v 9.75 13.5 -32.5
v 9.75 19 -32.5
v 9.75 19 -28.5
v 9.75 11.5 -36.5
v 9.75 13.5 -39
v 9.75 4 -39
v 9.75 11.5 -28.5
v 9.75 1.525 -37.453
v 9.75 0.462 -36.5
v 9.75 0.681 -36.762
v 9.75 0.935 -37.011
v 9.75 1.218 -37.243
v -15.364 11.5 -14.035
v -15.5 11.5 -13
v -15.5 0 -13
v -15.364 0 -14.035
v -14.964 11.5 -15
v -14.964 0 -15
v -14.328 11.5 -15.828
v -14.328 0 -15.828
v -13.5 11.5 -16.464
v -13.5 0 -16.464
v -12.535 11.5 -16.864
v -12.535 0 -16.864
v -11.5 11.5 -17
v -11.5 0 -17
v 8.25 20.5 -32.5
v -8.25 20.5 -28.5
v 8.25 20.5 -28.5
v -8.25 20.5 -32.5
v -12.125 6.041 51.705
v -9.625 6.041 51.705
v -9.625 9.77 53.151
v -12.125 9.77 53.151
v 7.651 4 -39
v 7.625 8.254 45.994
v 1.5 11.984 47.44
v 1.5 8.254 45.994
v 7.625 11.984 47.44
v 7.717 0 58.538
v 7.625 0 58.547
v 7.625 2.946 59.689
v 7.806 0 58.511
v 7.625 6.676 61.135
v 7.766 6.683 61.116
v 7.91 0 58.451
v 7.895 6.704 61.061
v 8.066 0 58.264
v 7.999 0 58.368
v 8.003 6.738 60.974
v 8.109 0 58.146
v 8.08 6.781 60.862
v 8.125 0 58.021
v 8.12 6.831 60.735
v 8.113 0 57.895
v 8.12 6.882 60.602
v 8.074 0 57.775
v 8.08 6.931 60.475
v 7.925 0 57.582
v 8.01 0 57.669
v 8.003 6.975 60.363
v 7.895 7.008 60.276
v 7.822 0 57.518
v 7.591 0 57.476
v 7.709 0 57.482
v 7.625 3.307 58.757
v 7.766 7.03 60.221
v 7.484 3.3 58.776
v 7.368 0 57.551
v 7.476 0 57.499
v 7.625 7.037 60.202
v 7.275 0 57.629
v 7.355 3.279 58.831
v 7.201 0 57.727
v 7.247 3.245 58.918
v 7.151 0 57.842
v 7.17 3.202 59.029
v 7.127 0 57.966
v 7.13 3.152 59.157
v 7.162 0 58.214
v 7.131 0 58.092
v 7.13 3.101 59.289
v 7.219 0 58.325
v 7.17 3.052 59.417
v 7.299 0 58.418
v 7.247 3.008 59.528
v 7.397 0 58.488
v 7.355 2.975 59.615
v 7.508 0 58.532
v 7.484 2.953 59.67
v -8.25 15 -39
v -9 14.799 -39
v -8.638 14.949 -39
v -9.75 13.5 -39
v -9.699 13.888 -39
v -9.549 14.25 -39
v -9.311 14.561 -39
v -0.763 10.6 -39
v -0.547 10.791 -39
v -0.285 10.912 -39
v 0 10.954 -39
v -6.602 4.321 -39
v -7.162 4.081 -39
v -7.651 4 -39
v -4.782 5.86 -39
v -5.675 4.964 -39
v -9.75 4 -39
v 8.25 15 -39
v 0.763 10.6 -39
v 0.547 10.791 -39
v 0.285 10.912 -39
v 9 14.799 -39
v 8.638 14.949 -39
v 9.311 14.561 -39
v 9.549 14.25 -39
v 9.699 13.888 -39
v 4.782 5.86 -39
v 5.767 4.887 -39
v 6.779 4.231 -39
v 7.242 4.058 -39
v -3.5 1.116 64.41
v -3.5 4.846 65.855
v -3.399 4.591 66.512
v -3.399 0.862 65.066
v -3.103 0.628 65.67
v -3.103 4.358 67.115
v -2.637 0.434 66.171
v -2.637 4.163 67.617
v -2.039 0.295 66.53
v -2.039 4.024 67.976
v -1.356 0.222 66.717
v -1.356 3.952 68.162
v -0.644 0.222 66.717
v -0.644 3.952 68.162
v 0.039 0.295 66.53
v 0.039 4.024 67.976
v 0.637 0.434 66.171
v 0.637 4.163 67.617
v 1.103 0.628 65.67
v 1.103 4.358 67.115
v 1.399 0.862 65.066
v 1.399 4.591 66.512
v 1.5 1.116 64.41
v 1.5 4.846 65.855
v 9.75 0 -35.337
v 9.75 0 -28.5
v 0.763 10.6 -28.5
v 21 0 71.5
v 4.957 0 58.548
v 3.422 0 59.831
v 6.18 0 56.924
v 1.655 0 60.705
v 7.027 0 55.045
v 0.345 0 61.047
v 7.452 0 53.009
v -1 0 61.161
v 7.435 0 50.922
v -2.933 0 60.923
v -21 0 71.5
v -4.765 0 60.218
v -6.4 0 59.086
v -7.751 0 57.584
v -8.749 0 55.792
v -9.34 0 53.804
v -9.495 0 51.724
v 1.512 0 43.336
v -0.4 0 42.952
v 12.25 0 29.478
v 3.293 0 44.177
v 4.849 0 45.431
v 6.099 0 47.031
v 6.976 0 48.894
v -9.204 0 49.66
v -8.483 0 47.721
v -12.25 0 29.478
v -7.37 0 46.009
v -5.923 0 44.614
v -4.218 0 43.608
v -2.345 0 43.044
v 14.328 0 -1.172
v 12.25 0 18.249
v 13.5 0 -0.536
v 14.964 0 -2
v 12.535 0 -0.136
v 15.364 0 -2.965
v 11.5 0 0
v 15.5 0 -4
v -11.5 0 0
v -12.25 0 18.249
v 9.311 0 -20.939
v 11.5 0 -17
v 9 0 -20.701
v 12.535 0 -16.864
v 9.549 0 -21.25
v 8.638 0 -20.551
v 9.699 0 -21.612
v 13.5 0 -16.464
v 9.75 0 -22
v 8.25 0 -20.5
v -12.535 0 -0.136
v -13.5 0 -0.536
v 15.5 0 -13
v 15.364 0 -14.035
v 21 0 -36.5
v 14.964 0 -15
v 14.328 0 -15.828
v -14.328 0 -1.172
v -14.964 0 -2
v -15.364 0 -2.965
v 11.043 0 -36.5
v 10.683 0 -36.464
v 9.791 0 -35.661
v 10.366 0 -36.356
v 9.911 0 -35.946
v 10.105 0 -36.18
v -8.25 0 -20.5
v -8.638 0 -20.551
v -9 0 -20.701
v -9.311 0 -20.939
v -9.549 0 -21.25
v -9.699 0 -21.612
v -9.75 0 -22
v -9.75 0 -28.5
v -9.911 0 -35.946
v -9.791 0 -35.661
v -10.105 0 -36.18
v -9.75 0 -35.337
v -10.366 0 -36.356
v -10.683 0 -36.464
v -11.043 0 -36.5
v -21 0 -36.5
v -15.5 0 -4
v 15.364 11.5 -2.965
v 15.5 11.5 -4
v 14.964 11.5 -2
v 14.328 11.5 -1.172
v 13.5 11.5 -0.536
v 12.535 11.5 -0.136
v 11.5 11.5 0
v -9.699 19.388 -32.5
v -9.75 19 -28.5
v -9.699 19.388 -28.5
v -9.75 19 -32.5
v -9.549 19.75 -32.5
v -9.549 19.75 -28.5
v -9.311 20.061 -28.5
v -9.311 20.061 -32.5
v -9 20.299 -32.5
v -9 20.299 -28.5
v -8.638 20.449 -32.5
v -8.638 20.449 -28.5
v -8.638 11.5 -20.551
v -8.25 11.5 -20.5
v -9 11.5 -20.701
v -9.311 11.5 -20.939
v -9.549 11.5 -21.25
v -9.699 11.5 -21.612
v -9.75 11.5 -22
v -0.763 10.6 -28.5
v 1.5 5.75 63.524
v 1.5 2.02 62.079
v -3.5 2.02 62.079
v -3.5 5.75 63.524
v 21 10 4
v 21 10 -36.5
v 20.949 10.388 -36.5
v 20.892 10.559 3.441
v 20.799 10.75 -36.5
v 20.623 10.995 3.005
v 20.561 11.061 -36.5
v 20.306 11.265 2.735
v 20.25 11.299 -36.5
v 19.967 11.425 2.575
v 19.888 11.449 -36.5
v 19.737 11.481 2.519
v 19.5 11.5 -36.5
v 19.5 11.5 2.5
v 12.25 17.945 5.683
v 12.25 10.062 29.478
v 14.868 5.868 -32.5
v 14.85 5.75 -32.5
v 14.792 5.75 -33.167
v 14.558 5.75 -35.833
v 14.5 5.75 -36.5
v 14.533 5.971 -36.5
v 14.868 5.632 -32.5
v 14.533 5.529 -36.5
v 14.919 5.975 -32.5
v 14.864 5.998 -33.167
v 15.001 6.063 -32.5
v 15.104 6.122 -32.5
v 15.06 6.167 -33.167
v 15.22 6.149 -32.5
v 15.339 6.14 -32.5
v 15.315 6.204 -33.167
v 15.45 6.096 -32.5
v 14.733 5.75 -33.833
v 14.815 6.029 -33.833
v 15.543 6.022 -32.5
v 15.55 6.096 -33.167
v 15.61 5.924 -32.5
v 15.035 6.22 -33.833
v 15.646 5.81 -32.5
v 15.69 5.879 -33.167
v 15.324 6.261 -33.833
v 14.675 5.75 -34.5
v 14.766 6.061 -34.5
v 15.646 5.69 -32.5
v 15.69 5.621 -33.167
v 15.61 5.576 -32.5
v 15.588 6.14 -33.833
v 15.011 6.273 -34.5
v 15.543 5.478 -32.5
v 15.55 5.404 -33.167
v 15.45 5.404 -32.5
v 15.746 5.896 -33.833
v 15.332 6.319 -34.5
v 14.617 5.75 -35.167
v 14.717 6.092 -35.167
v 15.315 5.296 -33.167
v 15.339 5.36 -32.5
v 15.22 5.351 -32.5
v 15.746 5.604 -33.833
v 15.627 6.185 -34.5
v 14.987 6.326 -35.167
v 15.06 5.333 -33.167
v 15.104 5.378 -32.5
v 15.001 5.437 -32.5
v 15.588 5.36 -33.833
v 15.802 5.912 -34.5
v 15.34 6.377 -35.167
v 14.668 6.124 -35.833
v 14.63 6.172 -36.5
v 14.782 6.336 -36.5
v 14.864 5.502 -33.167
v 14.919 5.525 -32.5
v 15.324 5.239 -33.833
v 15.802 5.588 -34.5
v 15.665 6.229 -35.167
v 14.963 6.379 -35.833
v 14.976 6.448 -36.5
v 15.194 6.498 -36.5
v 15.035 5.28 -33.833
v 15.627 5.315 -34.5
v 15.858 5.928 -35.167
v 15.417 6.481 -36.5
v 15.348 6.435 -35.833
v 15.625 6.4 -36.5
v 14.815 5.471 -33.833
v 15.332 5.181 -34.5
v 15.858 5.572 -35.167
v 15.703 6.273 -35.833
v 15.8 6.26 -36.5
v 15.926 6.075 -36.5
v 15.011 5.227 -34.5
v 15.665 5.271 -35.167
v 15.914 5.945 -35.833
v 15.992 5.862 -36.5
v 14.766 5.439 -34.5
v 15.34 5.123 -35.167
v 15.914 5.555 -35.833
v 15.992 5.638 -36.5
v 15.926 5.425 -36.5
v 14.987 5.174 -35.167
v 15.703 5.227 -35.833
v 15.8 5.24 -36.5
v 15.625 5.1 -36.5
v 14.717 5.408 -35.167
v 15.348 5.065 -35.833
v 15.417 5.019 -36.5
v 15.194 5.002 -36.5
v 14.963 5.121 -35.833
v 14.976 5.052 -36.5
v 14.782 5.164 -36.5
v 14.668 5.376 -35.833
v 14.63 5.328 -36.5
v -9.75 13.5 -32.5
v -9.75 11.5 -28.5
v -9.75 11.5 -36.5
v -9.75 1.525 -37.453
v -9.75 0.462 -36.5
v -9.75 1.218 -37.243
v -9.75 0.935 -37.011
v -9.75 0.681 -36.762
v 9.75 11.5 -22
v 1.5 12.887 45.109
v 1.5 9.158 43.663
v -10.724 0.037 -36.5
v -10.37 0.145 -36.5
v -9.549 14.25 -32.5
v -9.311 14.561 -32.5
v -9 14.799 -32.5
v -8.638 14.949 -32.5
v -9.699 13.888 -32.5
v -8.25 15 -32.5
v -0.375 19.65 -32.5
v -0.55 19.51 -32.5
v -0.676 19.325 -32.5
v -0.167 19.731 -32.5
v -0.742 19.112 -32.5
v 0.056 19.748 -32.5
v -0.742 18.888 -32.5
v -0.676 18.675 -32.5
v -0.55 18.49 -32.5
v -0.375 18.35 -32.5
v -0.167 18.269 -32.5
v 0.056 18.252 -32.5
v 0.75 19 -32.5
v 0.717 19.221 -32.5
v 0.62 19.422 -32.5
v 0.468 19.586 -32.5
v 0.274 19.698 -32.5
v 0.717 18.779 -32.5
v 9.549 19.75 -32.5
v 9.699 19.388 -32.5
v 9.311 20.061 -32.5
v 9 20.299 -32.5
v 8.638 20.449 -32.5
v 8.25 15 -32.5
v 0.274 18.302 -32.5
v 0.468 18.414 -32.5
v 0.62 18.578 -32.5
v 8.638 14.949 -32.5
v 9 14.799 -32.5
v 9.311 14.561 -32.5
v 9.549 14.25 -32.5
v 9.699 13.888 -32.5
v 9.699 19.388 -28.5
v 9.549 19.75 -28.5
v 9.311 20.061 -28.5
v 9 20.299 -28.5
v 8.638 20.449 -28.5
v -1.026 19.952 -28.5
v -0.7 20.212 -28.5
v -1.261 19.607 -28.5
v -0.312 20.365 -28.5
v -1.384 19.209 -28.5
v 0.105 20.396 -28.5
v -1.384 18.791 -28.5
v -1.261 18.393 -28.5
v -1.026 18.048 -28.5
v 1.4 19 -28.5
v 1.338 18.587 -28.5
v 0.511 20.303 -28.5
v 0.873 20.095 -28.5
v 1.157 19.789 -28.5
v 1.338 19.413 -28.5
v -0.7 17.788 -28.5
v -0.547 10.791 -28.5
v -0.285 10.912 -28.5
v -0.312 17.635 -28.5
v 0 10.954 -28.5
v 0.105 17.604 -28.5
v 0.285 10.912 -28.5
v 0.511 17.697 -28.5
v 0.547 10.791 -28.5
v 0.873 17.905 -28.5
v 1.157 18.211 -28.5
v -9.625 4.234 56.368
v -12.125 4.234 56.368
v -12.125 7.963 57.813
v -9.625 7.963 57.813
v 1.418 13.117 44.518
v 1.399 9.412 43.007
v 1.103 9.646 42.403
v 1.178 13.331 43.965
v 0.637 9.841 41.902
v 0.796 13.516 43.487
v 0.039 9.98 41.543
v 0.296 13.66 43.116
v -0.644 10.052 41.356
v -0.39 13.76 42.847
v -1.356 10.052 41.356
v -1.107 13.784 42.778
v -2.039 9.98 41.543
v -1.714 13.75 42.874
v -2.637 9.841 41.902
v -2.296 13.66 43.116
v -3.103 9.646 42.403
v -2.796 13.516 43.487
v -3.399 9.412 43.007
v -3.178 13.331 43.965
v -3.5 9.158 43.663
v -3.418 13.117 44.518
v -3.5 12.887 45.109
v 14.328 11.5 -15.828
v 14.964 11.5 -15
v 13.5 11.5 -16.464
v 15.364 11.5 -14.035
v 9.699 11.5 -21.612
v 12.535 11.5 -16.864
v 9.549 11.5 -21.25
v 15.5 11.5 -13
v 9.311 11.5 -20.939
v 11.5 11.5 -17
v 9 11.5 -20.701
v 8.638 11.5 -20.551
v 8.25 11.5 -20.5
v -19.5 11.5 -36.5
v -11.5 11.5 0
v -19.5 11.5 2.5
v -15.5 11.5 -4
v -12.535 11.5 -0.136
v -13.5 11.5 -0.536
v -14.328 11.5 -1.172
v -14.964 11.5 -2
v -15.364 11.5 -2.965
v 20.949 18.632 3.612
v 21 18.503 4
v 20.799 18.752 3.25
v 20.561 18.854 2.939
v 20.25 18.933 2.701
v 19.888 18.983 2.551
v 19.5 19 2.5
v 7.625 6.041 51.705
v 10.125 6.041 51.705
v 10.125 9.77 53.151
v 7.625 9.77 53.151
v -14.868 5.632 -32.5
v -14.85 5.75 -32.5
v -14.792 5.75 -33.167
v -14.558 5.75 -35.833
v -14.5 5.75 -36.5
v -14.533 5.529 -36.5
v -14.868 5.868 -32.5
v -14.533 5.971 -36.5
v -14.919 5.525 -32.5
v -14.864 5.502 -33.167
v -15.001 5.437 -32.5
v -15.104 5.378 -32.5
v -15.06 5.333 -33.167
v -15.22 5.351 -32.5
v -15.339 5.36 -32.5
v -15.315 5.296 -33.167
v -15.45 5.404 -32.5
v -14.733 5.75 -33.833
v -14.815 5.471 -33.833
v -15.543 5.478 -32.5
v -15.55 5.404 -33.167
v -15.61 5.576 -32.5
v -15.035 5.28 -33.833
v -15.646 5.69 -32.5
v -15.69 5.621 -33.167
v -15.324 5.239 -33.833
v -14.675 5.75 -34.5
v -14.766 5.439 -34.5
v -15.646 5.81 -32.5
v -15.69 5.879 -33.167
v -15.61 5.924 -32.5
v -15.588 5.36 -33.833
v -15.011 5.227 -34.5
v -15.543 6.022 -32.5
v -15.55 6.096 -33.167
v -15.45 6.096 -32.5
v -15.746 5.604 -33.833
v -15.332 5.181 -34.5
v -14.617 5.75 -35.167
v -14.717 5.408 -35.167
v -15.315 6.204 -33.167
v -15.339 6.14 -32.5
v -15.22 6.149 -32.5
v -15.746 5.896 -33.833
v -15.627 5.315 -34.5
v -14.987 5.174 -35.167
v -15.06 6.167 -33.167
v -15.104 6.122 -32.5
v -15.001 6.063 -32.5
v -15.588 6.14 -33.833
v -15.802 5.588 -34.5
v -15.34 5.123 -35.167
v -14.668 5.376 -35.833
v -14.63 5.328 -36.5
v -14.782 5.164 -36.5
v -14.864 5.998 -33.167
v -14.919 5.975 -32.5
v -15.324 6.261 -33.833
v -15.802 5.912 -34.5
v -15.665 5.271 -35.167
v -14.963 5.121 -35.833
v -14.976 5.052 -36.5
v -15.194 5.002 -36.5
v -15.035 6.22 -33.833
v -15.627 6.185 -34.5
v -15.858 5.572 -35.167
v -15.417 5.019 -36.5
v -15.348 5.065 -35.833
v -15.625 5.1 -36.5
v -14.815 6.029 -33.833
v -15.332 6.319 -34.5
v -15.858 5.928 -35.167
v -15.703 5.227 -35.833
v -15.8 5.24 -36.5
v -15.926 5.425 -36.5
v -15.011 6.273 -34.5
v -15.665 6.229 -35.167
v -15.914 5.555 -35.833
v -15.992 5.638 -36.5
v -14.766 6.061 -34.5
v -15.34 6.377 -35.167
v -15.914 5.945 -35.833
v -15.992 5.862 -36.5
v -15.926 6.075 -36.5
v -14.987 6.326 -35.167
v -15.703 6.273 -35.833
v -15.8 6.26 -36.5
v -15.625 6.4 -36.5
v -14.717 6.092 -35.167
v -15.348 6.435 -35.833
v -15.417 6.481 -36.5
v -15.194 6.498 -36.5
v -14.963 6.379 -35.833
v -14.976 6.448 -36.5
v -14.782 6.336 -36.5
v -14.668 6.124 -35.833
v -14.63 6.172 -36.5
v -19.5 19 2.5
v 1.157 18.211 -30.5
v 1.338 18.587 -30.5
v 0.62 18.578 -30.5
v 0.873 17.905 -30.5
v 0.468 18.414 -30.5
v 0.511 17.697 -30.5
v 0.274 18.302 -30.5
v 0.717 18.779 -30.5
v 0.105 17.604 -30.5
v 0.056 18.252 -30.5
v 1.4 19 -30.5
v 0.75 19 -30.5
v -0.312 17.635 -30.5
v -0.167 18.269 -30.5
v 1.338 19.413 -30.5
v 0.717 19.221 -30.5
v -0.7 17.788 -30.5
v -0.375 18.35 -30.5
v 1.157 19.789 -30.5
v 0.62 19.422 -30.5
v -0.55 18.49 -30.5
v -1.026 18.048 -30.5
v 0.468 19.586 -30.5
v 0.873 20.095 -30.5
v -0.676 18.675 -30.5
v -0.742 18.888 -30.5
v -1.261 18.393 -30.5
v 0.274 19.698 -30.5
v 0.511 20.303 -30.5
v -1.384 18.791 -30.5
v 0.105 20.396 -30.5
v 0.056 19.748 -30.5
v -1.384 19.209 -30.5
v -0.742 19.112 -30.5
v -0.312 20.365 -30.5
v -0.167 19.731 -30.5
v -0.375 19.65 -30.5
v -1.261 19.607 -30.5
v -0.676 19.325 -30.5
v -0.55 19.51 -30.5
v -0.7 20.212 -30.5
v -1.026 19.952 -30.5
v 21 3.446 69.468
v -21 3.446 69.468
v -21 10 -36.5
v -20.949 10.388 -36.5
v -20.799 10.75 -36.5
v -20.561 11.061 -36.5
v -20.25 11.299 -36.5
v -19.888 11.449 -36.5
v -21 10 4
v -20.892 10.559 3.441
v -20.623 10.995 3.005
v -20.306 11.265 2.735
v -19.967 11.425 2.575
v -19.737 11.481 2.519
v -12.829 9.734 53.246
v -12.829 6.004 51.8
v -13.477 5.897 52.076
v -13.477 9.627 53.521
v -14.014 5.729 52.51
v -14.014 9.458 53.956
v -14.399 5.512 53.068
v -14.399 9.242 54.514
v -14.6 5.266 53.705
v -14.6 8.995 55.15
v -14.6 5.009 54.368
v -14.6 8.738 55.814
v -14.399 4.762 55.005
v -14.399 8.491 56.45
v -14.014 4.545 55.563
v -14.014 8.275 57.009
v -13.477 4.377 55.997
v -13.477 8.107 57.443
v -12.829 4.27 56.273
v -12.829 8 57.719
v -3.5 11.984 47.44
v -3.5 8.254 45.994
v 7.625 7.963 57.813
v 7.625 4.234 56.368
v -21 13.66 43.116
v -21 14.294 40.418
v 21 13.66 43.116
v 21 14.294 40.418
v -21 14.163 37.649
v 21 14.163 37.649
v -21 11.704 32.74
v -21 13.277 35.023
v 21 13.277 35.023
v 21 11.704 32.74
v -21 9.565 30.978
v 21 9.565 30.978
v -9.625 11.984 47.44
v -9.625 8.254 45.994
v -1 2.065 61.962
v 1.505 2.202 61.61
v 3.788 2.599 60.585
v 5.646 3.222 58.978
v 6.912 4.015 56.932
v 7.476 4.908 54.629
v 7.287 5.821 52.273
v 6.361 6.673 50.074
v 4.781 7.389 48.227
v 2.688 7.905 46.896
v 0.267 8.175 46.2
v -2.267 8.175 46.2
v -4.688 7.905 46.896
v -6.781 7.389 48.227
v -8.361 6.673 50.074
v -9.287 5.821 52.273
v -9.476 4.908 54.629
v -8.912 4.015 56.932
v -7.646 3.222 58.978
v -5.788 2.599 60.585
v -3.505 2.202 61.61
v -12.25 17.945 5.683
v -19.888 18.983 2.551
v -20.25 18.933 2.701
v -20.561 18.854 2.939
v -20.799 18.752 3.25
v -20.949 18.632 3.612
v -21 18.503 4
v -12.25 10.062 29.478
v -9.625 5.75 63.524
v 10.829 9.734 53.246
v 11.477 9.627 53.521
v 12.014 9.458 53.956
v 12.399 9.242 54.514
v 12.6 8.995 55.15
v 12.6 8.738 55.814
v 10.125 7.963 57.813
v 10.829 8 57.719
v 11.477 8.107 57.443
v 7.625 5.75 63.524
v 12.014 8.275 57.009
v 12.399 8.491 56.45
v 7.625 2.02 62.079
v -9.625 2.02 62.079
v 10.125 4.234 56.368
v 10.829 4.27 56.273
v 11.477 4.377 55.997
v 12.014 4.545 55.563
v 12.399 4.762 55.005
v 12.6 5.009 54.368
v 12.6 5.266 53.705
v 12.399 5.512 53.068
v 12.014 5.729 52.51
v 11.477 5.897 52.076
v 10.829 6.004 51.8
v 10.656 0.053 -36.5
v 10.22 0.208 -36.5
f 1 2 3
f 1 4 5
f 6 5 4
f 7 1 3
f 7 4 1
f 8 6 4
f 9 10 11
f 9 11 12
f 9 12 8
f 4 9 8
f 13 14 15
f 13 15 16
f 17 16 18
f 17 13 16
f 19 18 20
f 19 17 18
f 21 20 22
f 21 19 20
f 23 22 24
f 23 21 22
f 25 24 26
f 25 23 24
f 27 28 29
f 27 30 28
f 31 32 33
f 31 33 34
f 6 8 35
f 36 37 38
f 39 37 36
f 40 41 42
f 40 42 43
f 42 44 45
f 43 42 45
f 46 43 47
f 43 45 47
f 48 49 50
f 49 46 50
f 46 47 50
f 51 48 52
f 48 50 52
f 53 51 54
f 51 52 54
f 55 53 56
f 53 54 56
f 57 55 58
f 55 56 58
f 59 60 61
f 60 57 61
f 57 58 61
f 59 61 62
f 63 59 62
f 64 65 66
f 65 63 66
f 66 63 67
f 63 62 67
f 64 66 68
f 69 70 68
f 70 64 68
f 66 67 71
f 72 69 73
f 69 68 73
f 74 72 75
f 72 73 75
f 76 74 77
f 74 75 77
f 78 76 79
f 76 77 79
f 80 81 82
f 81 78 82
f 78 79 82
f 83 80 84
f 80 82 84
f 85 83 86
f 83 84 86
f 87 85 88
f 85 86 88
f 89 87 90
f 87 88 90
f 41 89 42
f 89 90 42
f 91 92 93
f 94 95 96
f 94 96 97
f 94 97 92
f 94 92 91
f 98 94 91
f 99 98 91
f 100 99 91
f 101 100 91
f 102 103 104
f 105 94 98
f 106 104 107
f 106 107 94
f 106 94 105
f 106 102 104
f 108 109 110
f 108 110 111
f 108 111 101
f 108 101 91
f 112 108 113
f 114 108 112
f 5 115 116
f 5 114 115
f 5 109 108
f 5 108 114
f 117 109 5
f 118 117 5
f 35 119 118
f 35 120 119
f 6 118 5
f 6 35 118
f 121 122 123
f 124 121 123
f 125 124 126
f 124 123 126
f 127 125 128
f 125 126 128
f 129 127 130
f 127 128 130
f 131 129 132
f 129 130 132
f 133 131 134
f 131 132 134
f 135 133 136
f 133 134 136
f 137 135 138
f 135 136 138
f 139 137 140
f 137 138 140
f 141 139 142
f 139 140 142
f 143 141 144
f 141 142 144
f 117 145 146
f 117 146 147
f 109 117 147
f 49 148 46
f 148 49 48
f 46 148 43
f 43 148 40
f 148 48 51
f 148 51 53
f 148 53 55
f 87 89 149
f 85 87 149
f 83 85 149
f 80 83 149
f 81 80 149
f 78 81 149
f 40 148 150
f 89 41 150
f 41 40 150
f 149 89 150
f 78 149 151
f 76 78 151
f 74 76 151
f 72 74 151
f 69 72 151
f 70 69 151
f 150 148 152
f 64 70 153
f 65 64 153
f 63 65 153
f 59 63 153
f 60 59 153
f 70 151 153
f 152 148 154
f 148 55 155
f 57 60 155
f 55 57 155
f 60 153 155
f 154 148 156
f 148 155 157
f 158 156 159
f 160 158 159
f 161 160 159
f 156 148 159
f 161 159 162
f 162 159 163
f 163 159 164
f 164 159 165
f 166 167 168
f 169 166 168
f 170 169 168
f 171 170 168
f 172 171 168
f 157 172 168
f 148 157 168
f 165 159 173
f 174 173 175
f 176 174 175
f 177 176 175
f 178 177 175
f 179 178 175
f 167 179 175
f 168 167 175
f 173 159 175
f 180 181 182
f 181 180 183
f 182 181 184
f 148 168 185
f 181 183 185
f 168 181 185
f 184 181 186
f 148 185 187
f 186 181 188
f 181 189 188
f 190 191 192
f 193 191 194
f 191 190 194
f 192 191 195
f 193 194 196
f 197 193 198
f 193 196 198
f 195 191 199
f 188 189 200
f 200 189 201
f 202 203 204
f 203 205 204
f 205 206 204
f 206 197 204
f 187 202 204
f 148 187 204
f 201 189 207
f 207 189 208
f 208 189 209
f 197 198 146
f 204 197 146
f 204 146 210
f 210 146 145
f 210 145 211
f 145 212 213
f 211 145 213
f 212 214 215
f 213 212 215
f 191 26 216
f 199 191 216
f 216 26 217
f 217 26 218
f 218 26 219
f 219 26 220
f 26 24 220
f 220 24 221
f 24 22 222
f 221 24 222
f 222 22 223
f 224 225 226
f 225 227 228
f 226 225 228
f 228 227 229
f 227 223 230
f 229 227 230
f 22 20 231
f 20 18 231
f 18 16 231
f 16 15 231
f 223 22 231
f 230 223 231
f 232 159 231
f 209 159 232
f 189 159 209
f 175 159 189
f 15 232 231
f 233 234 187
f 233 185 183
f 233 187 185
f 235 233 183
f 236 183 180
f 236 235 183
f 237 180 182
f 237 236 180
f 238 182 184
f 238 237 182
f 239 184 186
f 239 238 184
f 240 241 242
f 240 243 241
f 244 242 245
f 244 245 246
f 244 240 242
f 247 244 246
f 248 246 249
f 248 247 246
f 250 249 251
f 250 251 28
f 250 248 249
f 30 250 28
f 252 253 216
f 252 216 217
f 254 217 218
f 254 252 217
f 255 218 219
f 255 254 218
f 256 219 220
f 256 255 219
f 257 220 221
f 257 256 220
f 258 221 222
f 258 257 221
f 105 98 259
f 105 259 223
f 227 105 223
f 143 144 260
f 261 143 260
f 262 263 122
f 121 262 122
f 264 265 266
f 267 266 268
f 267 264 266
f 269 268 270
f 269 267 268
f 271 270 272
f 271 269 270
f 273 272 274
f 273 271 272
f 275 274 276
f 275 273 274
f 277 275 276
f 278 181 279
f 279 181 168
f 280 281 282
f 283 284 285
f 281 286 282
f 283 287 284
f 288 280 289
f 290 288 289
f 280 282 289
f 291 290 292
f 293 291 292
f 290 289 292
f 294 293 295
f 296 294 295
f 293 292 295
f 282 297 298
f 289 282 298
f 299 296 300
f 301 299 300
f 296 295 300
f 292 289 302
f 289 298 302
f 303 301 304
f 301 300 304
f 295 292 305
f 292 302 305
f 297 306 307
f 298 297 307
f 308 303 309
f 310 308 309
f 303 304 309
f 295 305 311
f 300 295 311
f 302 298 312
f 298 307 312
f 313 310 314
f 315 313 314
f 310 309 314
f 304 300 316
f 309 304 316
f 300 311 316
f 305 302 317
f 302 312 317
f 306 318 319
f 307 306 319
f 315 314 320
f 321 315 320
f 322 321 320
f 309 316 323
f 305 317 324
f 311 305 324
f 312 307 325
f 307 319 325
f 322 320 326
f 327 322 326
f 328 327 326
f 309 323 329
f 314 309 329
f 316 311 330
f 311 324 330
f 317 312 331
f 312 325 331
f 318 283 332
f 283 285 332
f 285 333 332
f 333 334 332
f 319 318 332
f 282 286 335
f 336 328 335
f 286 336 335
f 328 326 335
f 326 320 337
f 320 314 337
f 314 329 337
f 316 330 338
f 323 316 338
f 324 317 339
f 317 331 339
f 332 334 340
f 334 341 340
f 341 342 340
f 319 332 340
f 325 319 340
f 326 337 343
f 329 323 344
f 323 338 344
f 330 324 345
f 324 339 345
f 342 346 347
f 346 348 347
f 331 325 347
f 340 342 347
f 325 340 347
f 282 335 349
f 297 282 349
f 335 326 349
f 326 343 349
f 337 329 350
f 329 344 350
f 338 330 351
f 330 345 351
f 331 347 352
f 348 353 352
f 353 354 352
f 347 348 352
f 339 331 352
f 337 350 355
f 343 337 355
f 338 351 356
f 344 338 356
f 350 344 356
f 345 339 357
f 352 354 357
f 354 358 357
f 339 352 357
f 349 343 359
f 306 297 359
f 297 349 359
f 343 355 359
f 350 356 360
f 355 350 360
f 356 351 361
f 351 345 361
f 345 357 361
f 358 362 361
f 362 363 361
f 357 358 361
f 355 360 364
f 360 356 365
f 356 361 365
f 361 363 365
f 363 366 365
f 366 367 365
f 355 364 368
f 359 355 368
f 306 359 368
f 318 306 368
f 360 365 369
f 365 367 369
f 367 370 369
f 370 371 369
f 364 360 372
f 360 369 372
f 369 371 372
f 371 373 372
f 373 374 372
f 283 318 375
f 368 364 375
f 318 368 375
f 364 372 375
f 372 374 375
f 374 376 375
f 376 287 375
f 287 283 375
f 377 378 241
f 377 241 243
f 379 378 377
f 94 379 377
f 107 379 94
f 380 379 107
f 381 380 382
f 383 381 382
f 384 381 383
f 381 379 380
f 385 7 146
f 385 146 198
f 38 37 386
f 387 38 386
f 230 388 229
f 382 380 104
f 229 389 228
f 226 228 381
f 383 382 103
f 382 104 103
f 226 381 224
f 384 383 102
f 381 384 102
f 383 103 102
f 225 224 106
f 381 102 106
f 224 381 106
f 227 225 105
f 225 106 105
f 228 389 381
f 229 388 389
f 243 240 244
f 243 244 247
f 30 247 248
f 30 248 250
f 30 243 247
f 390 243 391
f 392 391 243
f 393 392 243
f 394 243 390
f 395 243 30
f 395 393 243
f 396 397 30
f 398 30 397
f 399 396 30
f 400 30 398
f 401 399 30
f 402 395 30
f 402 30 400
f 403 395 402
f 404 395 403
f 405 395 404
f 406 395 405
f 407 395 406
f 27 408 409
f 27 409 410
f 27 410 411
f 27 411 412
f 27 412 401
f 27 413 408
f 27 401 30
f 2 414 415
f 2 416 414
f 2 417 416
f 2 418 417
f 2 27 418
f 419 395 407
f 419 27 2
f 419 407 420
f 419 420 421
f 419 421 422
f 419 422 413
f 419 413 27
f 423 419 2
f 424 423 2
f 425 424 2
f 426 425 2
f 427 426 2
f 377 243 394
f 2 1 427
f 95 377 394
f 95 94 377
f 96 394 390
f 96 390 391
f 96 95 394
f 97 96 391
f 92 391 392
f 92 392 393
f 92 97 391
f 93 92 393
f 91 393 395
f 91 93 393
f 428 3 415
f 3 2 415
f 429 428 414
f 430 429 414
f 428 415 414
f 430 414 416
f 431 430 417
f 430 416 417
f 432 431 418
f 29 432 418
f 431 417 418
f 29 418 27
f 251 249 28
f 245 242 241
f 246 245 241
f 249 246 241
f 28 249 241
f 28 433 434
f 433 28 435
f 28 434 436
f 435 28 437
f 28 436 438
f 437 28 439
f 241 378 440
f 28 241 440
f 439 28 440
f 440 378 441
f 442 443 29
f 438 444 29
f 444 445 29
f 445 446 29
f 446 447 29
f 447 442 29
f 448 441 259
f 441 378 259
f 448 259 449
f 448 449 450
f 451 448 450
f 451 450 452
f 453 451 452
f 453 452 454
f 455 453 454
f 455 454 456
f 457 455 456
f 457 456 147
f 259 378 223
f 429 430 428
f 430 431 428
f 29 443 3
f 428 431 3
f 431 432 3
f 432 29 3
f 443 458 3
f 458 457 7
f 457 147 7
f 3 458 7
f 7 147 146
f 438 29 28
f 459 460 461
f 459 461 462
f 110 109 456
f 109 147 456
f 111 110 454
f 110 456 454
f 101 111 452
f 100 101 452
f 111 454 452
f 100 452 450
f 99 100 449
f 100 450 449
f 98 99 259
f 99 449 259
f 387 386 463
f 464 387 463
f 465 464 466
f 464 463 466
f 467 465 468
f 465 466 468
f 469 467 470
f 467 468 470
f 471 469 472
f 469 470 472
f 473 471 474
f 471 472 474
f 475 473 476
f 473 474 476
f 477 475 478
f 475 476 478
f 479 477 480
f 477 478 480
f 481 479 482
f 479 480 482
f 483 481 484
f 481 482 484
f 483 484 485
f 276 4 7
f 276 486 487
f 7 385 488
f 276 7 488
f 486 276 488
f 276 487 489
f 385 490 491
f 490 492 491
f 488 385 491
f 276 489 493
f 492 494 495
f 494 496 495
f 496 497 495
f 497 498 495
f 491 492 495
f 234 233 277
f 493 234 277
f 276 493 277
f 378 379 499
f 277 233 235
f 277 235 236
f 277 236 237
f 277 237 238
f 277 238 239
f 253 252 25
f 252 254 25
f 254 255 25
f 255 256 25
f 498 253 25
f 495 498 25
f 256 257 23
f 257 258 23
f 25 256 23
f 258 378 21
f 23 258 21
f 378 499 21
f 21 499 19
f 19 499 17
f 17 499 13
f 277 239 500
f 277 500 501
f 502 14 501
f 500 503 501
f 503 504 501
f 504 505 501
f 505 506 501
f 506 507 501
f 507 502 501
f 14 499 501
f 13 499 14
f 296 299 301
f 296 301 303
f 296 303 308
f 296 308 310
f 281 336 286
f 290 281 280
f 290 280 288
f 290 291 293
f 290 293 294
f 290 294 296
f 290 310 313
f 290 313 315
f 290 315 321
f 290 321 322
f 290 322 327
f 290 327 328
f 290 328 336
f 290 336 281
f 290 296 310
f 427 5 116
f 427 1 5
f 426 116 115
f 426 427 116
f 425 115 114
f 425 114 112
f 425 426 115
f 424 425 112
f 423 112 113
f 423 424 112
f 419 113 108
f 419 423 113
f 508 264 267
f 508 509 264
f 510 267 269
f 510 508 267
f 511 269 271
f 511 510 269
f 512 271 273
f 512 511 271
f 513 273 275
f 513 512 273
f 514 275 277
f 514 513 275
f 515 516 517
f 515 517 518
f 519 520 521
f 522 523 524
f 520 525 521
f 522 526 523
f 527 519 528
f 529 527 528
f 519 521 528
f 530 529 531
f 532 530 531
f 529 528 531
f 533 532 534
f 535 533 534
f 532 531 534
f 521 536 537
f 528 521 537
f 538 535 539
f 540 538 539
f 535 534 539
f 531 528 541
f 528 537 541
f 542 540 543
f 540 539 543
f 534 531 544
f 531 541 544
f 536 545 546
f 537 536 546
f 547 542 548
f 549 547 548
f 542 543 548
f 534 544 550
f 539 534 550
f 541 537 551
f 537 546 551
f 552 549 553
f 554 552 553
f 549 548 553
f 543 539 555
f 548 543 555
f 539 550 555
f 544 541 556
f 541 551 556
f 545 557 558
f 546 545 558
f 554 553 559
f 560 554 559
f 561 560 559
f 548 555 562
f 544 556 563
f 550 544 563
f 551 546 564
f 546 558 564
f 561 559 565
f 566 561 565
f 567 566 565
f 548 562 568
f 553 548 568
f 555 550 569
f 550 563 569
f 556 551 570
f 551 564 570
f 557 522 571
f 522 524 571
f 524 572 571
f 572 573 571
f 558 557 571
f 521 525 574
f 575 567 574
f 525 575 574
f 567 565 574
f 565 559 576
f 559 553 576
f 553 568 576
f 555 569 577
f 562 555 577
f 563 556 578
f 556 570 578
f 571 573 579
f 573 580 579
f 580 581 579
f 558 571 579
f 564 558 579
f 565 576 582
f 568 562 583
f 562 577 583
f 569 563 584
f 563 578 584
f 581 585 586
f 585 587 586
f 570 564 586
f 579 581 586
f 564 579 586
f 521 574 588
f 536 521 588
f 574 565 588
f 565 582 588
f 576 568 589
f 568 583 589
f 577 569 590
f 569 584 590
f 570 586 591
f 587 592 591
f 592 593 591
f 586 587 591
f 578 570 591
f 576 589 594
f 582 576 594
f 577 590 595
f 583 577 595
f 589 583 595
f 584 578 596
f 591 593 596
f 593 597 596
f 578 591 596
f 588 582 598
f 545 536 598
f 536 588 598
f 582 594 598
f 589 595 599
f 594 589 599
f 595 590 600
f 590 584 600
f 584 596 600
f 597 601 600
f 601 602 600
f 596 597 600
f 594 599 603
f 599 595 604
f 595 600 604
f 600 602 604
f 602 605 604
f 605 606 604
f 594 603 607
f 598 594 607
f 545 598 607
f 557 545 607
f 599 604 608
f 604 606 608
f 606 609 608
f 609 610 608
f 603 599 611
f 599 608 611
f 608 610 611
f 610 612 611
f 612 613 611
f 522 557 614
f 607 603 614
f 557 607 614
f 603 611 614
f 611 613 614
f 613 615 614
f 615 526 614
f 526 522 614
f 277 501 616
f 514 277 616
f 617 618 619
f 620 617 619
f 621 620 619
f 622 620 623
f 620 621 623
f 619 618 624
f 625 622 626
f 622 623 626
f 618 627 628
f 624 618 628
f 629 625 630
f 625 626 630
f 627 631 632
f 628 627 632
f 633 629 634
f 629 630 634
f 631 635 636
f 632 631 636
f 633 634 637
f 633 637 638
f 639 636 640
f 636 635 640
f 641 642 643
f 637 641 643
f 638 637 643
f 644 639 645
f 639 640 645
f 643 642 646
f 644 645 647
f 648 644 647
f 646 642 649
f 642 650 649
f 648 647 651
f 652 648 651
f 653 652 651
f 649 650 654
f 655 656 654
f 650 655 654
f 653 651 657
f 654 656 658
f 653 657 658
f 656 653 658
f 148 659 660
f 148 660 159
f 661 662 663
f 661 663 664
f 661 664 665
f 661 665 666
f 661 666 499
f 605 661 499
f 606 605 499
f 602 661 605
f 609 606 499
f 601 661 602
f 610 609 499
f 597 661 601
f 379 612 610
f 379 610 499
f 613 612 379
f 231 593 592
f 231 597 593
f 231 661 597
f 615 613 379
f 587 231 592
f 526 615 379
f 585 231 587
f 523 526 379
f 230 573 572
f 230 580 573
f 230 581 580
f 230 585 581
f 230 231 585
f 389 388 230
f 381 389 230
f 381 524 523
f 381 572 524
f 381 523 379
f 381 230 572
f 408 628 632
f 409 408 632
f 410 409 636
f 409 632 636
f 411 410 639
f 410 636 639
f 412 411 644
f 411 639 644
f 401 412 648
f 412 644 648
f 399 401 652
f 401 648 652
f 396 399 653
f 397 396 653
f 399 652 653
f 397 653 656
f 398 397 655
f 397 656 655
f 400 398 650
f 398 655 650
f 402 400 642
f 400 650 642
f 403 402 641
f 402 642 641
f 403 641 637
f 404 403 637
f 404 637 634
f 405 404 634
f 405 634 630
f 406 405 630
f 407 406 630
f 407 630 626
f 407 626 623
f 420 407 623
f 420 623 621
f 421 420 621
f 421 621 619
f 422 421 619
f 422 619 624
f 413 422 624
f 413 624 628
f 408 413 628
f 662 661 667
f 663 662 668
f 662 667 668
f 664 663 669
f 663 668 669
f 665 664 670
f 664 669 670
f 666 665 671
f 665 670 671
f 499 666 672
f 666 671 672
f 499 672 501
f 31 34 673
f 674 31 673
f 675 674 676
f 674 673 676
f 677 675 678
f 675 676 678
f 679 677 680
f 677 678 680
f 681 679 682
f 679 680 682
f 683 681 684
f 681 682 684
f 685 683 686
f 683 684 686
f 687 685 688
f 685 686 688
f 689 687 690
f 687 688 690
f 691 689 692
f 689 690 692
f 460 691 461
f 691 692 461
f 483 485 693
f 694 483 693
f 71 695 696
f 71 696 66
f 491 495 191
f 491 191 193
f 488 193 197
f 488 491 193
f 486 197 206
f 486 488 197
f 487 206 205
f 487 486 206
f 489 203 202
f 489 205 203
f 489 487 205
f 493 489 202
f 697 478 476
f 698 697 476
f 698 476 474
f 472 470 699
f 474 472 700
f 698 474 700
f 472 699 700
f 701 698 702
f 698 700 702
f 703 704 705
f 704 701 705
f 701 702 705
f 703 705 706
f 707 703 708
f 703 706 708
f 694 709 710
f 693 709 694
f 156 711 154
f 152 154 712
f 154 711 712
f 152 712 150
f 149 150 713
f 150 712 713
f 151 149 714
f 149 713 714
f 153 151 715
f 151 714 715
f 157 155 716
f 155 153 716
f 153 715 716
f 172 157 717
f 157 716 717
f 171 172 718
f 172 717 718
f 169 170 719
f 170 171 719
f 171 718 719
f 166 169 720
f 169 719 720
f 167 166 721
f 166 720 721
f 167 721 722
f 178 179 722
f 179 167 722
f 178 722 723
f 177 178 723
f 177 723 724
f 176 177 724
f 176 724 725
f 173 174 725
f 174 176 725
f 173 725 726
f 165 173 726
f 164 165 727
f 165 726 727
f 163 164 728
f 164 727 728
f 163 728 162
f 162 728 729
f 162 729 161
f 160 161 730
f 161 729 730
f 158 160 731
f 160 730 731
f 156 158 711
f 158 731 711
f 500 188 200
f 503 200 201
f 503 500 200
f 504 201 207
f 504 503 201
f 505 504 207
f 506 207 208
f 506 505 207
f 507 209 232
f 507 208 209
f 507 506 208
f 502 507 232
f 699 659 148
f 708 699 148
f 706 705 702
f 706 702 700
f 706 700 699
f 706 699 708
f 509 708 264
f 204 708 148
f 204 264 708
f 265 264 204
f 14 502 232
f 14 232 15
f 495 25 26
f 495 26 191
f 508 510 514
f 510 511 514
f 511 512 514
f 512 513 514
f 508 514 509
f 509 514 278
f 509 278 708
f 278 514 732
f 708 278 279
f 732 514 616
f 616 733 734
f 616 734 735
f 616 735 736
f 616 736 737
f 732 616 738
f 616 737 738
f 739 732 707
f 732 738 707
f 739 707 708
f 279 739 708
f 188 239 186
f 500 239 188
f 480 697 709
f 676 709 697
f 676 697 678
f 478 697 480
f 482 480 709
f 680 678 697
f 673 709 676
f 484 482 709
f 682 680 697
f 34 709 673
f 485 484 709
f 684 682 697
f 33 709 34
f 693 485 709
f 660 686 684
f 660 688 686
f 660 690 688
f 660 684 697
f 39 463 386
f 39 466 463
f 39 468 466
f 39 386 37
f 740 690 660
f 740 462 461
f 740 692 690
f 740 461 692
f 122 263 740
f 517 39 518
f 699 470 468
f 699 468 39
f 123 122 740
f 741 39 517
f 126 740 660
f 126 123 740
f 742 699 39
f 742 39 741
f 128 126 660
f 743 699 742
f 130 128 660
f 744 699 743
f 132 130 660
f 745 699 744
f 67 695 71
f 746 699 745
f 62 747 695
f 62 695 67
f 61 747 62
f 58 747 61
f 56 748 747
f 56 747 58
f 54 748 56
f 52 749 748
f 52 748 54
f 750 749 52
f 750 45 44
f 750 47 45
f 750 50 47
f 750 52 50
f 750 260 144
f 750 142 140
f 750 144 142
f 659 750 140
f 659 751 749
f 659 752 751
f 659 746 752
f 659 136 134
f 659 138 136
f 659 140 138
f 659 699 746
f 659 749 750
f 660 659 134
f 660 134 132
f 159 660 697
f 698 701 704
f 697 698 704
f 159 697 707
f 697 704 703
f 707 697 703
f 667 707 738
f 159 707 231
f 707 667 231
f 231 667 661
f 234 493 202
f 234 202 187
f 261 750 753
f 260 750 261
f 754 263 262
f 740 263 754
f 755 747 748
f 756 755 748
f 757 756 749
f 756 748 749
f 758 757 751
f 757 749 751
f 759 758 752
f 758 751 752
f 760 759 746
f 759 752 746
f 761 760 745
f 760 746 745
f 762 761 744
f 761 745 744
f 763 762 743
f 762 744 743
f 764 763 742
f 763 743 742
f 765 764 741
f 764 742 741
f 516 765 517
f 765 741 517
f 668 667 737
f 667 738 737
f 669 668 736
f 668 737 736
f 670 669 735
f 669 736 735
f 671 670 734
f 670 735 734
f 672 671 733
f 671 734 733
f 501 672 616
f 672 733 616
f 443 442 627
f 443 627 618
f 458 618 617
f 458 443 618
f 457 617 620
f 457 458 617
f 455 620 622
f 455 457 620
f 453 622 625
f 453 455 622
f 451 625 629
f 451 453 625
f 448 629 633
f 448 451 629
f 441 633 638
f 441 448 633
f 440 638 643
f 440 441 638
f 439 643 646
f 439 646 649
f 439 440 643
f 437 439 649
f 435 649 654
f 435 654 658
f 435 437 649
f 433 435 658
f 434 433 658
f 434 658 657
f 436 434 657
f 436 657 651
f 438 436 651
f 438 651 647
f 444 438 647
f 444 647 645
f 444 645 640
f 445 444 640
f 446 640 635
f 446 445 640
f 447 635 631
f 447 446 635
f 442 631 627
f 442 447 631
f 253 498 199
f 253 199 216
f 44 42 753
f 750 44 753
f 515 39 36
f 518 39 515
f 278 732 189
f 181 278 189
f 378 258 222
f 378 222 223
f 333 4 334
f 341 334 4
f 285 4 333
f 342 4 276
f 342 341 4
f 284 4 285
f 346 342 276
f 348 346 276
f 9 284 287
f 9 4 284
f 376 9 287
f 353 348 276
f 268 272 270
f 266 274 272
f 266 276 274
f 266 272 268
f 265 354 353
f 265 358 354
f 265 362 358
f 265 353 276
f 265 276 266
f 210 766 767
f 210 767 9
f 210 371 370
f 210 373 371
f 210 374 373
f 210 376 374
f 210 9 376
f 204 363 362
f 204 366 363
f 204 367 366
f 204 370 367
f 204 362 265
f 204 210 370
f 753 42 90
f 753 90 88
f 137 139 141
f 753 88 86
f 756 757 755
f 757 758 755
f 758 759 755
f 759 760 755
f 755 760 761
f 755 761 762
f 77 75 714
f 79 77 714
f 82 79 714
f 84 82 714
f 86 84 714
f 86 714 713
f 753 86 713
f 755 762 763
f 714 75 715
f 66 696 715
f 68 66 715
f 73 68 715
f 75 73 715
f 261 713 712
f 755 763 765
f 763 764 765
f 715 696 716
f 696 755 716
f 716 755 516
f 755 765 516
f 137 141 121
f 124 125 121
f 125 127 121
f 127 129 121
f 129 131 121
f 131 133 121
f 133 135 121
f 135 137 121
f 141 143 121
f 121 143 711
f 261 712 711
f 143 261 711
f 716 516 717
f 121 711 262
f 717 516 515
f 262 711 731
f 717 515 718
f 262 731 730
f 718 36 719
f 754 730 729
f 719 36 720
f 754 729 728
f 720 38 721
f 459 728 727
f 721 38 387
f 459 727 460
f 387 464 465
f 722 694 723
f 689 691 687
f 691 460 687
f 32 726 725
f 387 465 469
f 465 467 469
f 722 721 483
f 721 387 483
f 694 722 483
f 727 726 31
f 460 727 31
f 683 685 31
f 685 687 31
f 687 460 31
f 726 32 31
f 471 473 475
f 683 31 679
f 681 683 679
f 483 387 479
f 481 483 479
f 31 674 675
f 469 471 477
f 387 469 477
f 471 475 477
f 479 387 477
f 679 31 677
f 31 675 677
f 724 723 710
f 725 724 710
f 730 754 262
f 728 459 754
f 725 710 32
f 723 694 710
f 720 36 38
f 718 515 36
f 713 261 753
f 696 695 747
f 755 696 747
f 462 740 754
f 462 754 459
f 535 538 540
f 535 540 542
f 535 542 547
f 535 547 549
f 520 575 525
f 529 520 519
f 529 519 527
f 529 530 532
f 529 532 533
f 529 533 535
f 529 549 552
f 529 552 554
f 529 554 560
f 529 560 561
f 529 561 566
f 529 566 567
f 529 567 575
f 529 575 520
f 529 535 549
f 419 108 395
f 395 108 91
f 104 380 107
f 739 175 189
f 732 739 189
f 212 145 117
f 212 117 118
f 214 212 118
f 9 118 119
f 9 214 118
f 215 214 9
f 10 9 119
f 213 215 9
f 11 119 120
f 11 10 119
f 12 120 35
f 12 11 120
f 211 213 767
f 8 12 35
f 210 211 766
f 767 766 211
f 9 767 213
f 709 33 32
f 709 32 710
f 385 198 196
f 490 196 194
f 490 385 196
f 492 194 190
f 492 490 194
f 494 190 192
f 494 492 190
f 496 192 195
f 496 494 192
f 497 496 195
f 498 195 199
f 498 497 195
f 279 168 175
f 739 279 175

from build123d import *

# Parameters (mm, degrees)
EXTRUDE_1_DEPTH          = 19
CUT_EXTRUDE_1_REACH      = 60.798
CUT_EXTRUDE_2_DEPTH      = 19
SKETCH_5_W               = 19.5
SKETCH_5_H               = 3.999999999999993
EXTRUDE_2_DEPTH          = 9
EXTRUDE_3_DEPTH          = 3.5
EXTRUDE_3_DEPTH_BACK     = 11.5
CUT_EXTRUDE_3_REACH      = 83.003
FILLET_1_R               = 1.5
FILLET_2_R               = 1
CUT_EXTRUDE_4_DEPTH      = 19.999999999999996
FILLET_3_R               = 1.5
CUT_EXTRUDE_15_DEPTH     = 2
SKETCH_18_R              = 0.7500000000000009
CUT_EXTRUDE_16_DEPTH     = 4
SKETCH_20_R              = 0.7500000000000004
CUT_EXTRUDE_18_DEPTH     = 4
CUT_EXTRUDE_18_DRAFT     = -5.000000000000011
MIRROR_1_COPY_1_SKETCH_R = 0.7500000000000004
MIRROR_1_COPY_1_DEPTH    = 4
MIRROR_1_COPY_1_DRAFT    = -5.000000000000011
FILLET_7_R               = 1.5
CUT_EXTRUDE_22_DEPTH     = 24.000000000000007
EXTRUDE_4_DEPTH          = 42
SKETCH_24_R              = 2.499999999999999
SKETCH_24_R_2            = 2.500000000000004
CUT_EXTRUDE_23_DEPTH     = 4
SKETCH_25_R              = 8.5
CUT_EXTRUDE_24_DEPTH     = 70.91291338858937
CUT_EXTRUDE_25_DEPTH     = 70.94027802815528
EXTRUDE_5_DEPTH          = 24.5
FILLET_8_R               = 10
CUT_EXTRUDE_26_DEPTH     = 36.000000000000014


with BuildPart() as part:
    # 草图1 → 凸台-拉伸1 (new body)
    with BuildSketch(Plane(origin=(0, 0, 0), x_dir=(1, 0, 0), z_dir=(0, 1, 0))):
        Polygon((-20.999999999999996, 36.499999999999986), (21.000000000000004, 36.499999999999986), (21.00000000000001, -36.500000000000014), (-20.999999999999986, -36.500000000000014), align=None)
    extrude(amount=EXTRUDE_1_DEPTH)

    # 草图3 → 切除-拉伸1 (cut, up to next)
    with BuildSketch(Plane.ZY.offset(20.999999999999993), mode=Mode.PRIVATE) as cut_extrude_1_sk1:
        Polygon((-36.499999999999986, 19), (-36.499999999999986, 11.5), (2.500000000000014, 11.5), (2.500000000000016, 19), align=None)
    cut_extrude_1_tool1 = extrude(cut_extrude_1_sk1.sketch, amount=-CUT_EXTRUDE_1_REACH, mode=Mode.PRIVATE) & part.part
    # 草图3 → 切除-拉伸1 (cut, up to next)
    with BuildSketch(Plane.ZY.offset(20.999999999999993), mode=Mode.PRIVATE) as cut_extrude_1_sk2:
        Polygon((36.500000000000014, 19), (2.500000000000014, 19), (30.977695197165154, 9.564912493391638), (36.500000000000014, 0), align=None)
    cut_extrude_1_tool2 = extrude(cut_extrude_1_sk2.sketch, amount=-CUT_EXTRUDE_1_REACH, mode=Mode.PRIVATE) & part.part
    add(cut_extrude_1_tool1.solids().sort_by_distance((-21, 15.25, -17))[0], mode=Mode.SUBTRACT)
    add(cut_extrude_1_tool2.solids().sort_by_distance((-21, 14.294033, 26.119155))[0], mode=Mode.SUBTRACT)

    # 草图4 → 切除-拉伸2 (cut)
    with BuildSketch(Plane(origin=(0, 11.5, 0), x_dir=(1, 0, 0), z_dir=(0, 1, 0))):
        with BuildLine():
            ThreePointArc((-8.249999999999991, 20.499999999999986), (-9.310660171779816, 20.939339828220167), (-9.749999999999991, 21.99999999999999))
            Line((-9.749999999999991, 21.99999999999999), (-9.749999999999991, 28.49999999999999))
            Line((-9.749999999999991, 28.49999999999999), (9.750000000000009, 28.49999999999999))
            Line((9.750000000000009, 28.49999999999999), (9.750000000000009, 21.999999999999993))
            ThreePointArc((9.750000000000009, 21.999999999999993), (9.31066017177983, 20.93933982822017), (8.250000000000009, 20.49999999999999))
            Line((8.250000000000009, 20.49999999999999), (-8.249999999999991, 20.499999999999986))
        make_face()
    extrude(amount=-CUT_EXTRUDE_2_DEPTH, mode=Mode.SUBTRACT)

    # 草图5 → 凸台-拉伸2 (add)
    with BuildSketch(Plane(origin=(0, 11.5, 0), x_dir=(1, 0, 0), z_dir=(0, 1, 0))):
        with Locations((8.88e-15, 30.49999999999999)):
            Rectangle(SKETCH_5_W, SKETCH_5_H)
    extrude(amount=EXTRUDE_2_DEPTH)

    # 草图6 → 凸台-拉伸3 (add, two sides: drawn at the far end of the back side and taken through both)
    with BuildSketch(Plane(origin=(0, 11.5, 0), x_dir=(1, 0, 0), z_dir=(0, 1, 0)).offset(-EXTRUDE_3_DEPTH_BACK)):
        Polygon((-9.749999999999991, 32.499999999999986), (-9.749999999999991, 38.999999999999986), (9.750000000000007, 38.999999999999986), (9.750000000000009, 32.499999999999986), align=None)
    extrude(amount=EXTRUDE_3_DEPTH + EXTRUDE_3_DEPTH_BACK)

    # 草图7 → 切除-拉伸3 (cut, up to next)
    with BuildSketch(Plane(origin=(0, 0, -38.999999999999986), x_dir=(-1, 0, 0), z_dir=(0, 0, -1)), mode=Mode.PRIVATE) as cut_extrude_3_sk1:
        Polygon((0, 11.500000000000002), (9.749999999999991, 0), (-9.750000000000007, -6.94e-15), align=None)
    cut_extrude_3_tool1 = extrude(cut_extrude_3_sk1.sketch, amount=-CUT_EXTRUDE_3_REACH, mode=Mode.PRIVATE) & part.part
    add(cut_extrude_3_tool1.solids().sort_by_distance((0, 3.833333, -39))[0], mode=Mode.SUBTRACT)

    # 圆角1
    fillet_1_edges = [part.edges().sort_by_distance(p)[0] for p in [
        (9.750000000000009, 20.5, -30.499999999999986),
        (-9.749999999999991, 20.5, -30.499999999999986),
        (9.750000000000007, 15, -35.749999999999986),
        (-9.749999999999991, 15, -35.749999999999986),
    ]]
    fillet(fillet_1_edges, radius=FILLET_1_R)

    # 圆角2
    fillet_2_edges = [part.edges().sort_by_distance(p)[0] for p in [
        (0, 11.500000000000002, -33.749999999999986),
    ]]
    fillet(fillet_2_edges, radius=FILLET_2_R)

    # 草图8 → 切除-拉伸4 (cut)
    with BuildSketch(Plane(origin=(9.750000000000009, 0, 0), x_dir=(0, 0, -1), z_dir=(1, 0, 0))):
        Polygon((36.499999999999986, 0), (38.999999999999986, 4), (38.999999999999986, 0), align=None)
    extrude(amount=-CUT_EXTRUDE_4_DEPTH, mode=Mode.SUBTRACT)

    # 圆角3
    fillet_3_edges = [part.edges().sort_by_distance(p)[0] for p in [
        (8.054347826086955, 2.0000000000000036, -37.74999999999998),
        (-8.054347826086952, 1.9999999999999991, -37.749999999999986),
    ]]
    fillet(fillet_3_edges, radius=FILLET_3_R)

    # 草图17 → 切除-拉伸15 (cut)
    with BuildSketch(Plane(origin=(0, 0, -28.49999999999999), x_dir=(-1, 0, 0), z_dir=(0, 0, -1))):
        with BuildLine():
            ThreePointArc((1.39999999999999, 18.999999999999996), (-8.59e-15, 20.399999999999995), (-1.4000000000000072, 18.999999999999996))
            Line((-1.4000000000000075, 18.999999999999996), (1.3999999999999897, 18.999999999999996))
        make_face()
        with BuildLine():
            Line((1.3999999999999897, 18.999999999999996), (-1.4000000000000075, 18.999999999999996))
            ThreePointArc((-1.4000000000000072, 18.999999999999996), (-8.93e-15, 17.599999999999998), (1.39999999999999, 18.999999999999996))
        make_face()
    extrude(amount=CUT_EXTRUDE_15_DEPTH, mode=Mode.SUBTRACT)

    # 草图18 → 切除-拉伸16 (cut)
    with BuildSketch(Plane.XY.offset(-30.499999999999993)):
        with Locations((8.67e-15, 18.999999999999996)):
            Circle(SKETCH_18_R)
    extrude(amount=-CUT_EXTRUDE_16_DEPTH, mode=Mode.SUBTRACT)


with BuildPart() as cut_extrude_18_tool:
    # 草图20 → 切除-拉伸18 (with draft: the straight prism first)
    with BuildSketch(Plane(origin=(0, 0, -36.499999999999986), x_dir=(-1, 0, 0), z_dir=(0, 0, -1))):
        with Locations((-15.250000000000005, 5.75)):
            Circle(SKETCH_20_R)
    extrude(amount=-CUT_EXTRUDE_18_DEPTH)
    # 切除-拉伸18: the draft: its side faces are tilted about the plane it starts from
    cut_extrude_18_sides = [cut_extrude_18_tool.faces().sort_by_distance(p)[0] for p in [
        (16, 5.75, -34.5),
    ]]
    draft(cut_extrude_18_sides, Plane(origin=(0, 0, -36.499999999999986), x_dir=(-1, 0, 0), z_dir=(0, 0, -1)), CUT_EXTRUDE_18_DRAFT)


with BuildPart() as part_1:
    add(part.part)

    # 切除-拉伸18: cut by cut_extrude_18_tool
    add(cut_extrude_18_tool.part, mode=Mode.SUBTRACT)


with BuildPart() as mirror_1_copy_1_tool:
    # 镜向1 copy 1 sketch → 镜向1 copy 1 (with draft: the straight prism first)
    with BuildSketch(Plane(origin=(0, 0, -36.499999999999986), x_dir=(1, 0, 0), z_dir=(0, 0, -1))):
        with Locations((-15.250000000000005, -5.75)):
            Circle(MIRROR_1_COPY_1_SKETCH_R)
    extrude(amount=-MIRROR_1_COPY_1_DEPTH)
    # 镜向1 copy 1: the draft: its side faces are tilted about the plane it starts from
    mirror_1_copy_1_sides = [mirror_1_copy_1_tool.faces().sort_by_distance(p)[0] for p in [
        (-16, 5.75, -34.5),
    ]]
    draft(mirror_1_copy_1_sides, Plane(origin=(0, 0, -36.499999999999986), x_dir=(1, 0, 0), z_dir=(0, 0, -1)), MIRROR_1_COPY_1_DRAFT)


with BuildPart() as part_2:
    add(part_1.part)

    # 镜向1 copy 1: cut by mirror_1_copy_1_tool
    add(mirror_1_copy_1_tool.part, mode=Mode.SUBTRACT)

    # 圆角7
    fillet_7_edges = [part_2.edges().sort_by_distance(p)[0] for p in [
        (-20.999999999999996, 11.5, -16.999999999999982),
        (-20.999999999999993, 15.25, 2.500000000000019),
        (21.000000000000007, 15.25, 2.5000000000000138),
        (21.000000000000007, 11.5, -16.999999999999986),
    ]]
    fillet(fillet_7_edges, radius=FILLET_7_R)

    # 草图21 → 切除-拉伸22 (cut)
    with BuildSketch(Plane.XZ):
        Polygon((-12.24999999999999, 29.47769519716515), (-12.24999999999999, 5.683244946958155), (12.250000000000012, 5.683244946958155), (12.25000000000001, 29.477695197165154), align=None)
    extrude(amount=-CUT_EXTRUDE_22_DEPTH, mode=Mode.SUBTRACT)

    # 草图23 → 凸台-拉伸4 (add)
    with BuildSketch(Plane(origin=(21.000000000000007, 0, -2e-15), x_dir=(-1e-16, 0, -1), z_dir=(1, 0, -1e-16))):
        Polygon((-30.977695197165158, 9.564912493391638), (-30.977695197165158, 18.364912493391635), (-69.46824654038242, 3.445573664766443), (-71.50000000000001, 0), (-36.50000000000001, 0), align=None)
    extrude(amount=-EXTRUDE_4_DEPTH)

    # 草图24 → 切除-拉伸23 (cut)
    with BuildSketch(Plane(origin=(9.7e-16, 26.405047147072228, 10.23487145352138), x_dir=(1, -3e-17, -1e-17), z_dir=(0, 0.9324067733233699, 0.36141058238615825))):
        Polygon((-9.624999999999988, -57.15239682031271), (-9.624999999999988, -39.90239682031272), (7.625000000000015, -39.90239682031271), (7.625000000000015, -57.15239682031271), align=None)
        with Locations((10.125000000000002, -48.527396820312816)):
            Circle(SKETCH_24_R)
        with BuildLine():
            Line((7.625000000000015, -48.527396820312816), (7.625000000000015, -51.0273968203127))
            Line((7.625000000000007, -51.0273968203127), (10.125000000000009, -51.0273968203127))
            ThreePointArc((10.125000000000007, -51.027396820312816), (8.357233047033636, -50.295163773279185), (7.625000000000003, -48.527396820312816))
        make_face()
        with BuildLine():
            Line((7.625000000000015, -46.0273968203127), (7.625000000000015, -48.527396820312816))
            ThreePointArc((7.625000000000003, -48.527396820312816), (8.357233047033636, -46.75962986734645), (10.125000000000009, -46.027396820312816))
            Line((10.125000000000009, -46.0273968203127), (7.625000000000013, -46.0273968203127))
        make_face()
        with Locations((-12.12499999999999, -48.52739682031258)):
            Circle(SKETCH_24_R)
        with BuildLine():
            Line((-12.124999999999996, -51.027396820312674), (-9.624999999999988, -51.02739682031271))
            Line((-9.624999999999988, -51.02739682031271), (-9.624999999999988, -48.52739682031258))
            ThreePointArc((-9.62499999999999, -48.52739682031258), (-10.357233047033622, -50.29516377327895), (-12.124999999999996, -51.02739682031258))
        make_face()
        with BuildLine():
            ThreePointArc((-12.124999999999977, -46.02739682031258), (-10.357233047033617, -46.75962986734622), (-9.62499999999999, -48.52739682031258))
            Line((-9.624999999999988, -48.52739682031258), (-9.624999999999988, -46.0273968203127))
            Line((-9.624999999999988, -46.0273968203127), (-12.124999999999977, -46.027396820312674))
        make_face()
        with Locations((-0.9999999999999847, -37.40239682031271)):
            Circle(SKETCH_24_R_2)
        with BuildLine():
            Line((-0.9999999434812805, -39.90239682031271), (1.500000000000015, -39.90239682031271))
            Line((1.500000000000015, -39.90239682031272), (1.500000000000015, -37.40239682031271))
            ThreePointArc((1.5000000000000193, -37.40239682031271), (0.7677669729487664, -39.1701637532967), (-0.9999999434812799, -39.90239682031272))
        make_face()
        with BuildLine():
            Line((-3.499999999999985, -39.90239682031272), (-0.9999999434812805, -39.90239682031271))
            ThreePointArc((-0.9999999434812799, -39.90239682031272), (-2.7677669329839762, -39.17016379326146), (-3.4999999999999885, -37.40239682031271))
            Line((-3.499999999999984, -37.40239682031271), (-3.499999999999984, -39.90239682031271))
        make_face()
        with Locations((-1.000000000000067, -59.65239682031271)):
            Circle(SKETCH_24_R_2)
        with BuildLine():
            ThreePointArc((-1.0000000349305498, -57.1523968203127), (0.7677669406165137, -57.88462985499655), (1.499999999999937, -59.65239682031271))
            Line((1.500000000000015, -59.6523968203127), (1.500000000000015, -57.1523968203127))
            Line((1.500000000000015, -57.15239682031271), (-1.00000003493055, -57.15239682031271))
        make_face()
        with BuildLine():
            Line((-3.499999999999984, -57.15239682031271), (-3.499999999999984, -59.6523968203127))
            ThreePointArc((-3.500000000000071, -59.65239682031271), (-2.767766965316229, -57.88462987969613), (-1.0000000349305498, -57.1523968203127))
            Line((-1.00000003493055, -57.15239682031271), (-3.499999999999985, -57.15239682031271))
        make_face()
    extrude(amount=-CUT_EXTRUDE_23_DEPTH, mode=Mode.SUBTRACT)

    # 草图25 → 切除-拉伸24 (cut, through all)
    with BuildSketch(Plane(origin=(-6.7e-16, 22.67542005377876, 8.789229123976755), x_dir=(1, 3e-17, 1e-17), z_dir=(0, 0.9324067733233699, 0.3614105823861583))):
        with Locations(Location((-0.9999999999999868, -48.52739682031273, 0), (0, 0, 270))):
            Circle(SKETCH_25_R)
    extrude(amount=-CUT_EXTRUDE_24_DEPTH, mode=Mode.SUBTRACT)

    # 草图27 → 切除-拉伸25 (cut, through all)
    with BuildSketch(Plane(origin=(9.7e-16, 26.405047147072228, 10.23487145352138), x_dir=(1, -3e-17, -1e-17), z_dir=(0, 0.9324067733233699, 0.36141058238615825))):
        with BuildLine():
            ThreePointArc((7.625, -53.58989682031273), (7.125000000000012, -54.08989682031273), (7.624999999999999, -54.58989682031273))
            Line((7.625000000000016, -54.58989682031273), (7.625000000000016, -53.58989682031273))
        make_face()
        with BuildLine():
            Line((7.625000000000016, -53.58989682031273), (7.625000000000016, -54.58989682031273))
            ThreePointArc((7.624999999999999, -54.58989682031273), (7.978553390593286, -54.443450210906015), (8.12500000000002, -54.08989682031273))
            ThreePointArc((8.12500000000002, -54.08989682031273), (7.978553390593286, -53.73634342971945), (7.625, -53.58989682031273))
        make_face()
    extrude(amount=-CUT_EXTRUDE_25_DEPTH, mode=Mode.SUBTRACT)

    # 草图28 → 凸台-拉伸5 (add)
    with BuildSketch(Plane(origin=(-12.24999999999999, 0, 0), x_dir=(0, 0, -1), z_dir=(1, 0, 0))):
        Polygon((-5.683244946958155, 0), (-5.683244946958155, 17.94534320907723), (-18.248709537714582, 0), align=None)
    extrude(amount=EXTRUDE_5_DEPTH)

    # 圆角8
    # the kernel refuses this fillet: 10 mm, written as the material it takes off along each edge
    with BuildSketch(Plane(origin=(53.54506406890172, 18.364912493391635, 30.97769519716515), x_dir=(0, -1, -4e-16), z_dir=(-1, 0, 1e-16))) as fillet_8_piece_1:
        with BuildLine():
            CenterArc((14.028919956808336, 8.523989446573212), FILLET_8_R, 158.81314998741195, 79.6604084684634)
            Line((4.704852223574637, 12.138095270434794), (4.5183708689099635, 12.210377386912027))
            Line((4.5183708689099635, 12.210377386912027), (-0.1864813546646751, 0.07228211647723264))
            Line((-0.1864813546646751, 0.07228211647723264), (8e-17, -0.1999999999999993))
            ThreePointArc((8e-17, -0.1999999999999993), (4.399999999999999, -0.1999999999999975), (8.695421600863831, -0.1704797889314627))
            Line((8.695421600863831, -0.1704797889314627), (8.799999999999997, 0))
        make_face()
    extrude(amount=107.09012813780342, mode=Mode.SUBTRACT)

    # 草图30 → 切除-拉伸26 (cut)
    with BuildSketch(Plane(origin=(0, 11.5, 0), x_dir=(1, 0, 0), z_dir=(0, 1, 0))):
        with BuildLine():
            Line((11.499999999999979, -8.4e-16), (-11.499999999999968, -3.66e-15))
            ThreePointArc((-11.499999999999968, -3.66e-15), (-14.328427124746186, 1.1715728752538062), (-15.499999999999996, 4.000000000000024))
            Line((-15.499999999999996, 4.000000000000024), (-15.499999999999996, 12.999999999999948))
            ThreePointArc((-15.499999999999996, 12.999999999999948), (-14.328427124746188, 15.828427124746169), (-11.499999999999968, 16.99999999999998))
            Line((-11.499999999999968, 16.99999999999998), (11.499999999999975, 16.999999999999982))
            ThreePointArc((11.499999999999975, 16.999999999999982), (14.328427124746195, 15.828427124746174), (15.500000000000005, 12.999999999999956))
            Line((15.500000000000005, 12.999999999999956), (15.500000000000007, 4.000000000000028))
            ThreePointArc((15.500000000000007, 4.000000000000028), (14.328427124746197, 1.1715728752538093), (11.499999999999979, -8.4e-16))
        make_face()
    extrude(amount=-CUT_EXTRUDE_26_DEPTH, mode=Mode.SUBTRACT)


solid = part_2.part
